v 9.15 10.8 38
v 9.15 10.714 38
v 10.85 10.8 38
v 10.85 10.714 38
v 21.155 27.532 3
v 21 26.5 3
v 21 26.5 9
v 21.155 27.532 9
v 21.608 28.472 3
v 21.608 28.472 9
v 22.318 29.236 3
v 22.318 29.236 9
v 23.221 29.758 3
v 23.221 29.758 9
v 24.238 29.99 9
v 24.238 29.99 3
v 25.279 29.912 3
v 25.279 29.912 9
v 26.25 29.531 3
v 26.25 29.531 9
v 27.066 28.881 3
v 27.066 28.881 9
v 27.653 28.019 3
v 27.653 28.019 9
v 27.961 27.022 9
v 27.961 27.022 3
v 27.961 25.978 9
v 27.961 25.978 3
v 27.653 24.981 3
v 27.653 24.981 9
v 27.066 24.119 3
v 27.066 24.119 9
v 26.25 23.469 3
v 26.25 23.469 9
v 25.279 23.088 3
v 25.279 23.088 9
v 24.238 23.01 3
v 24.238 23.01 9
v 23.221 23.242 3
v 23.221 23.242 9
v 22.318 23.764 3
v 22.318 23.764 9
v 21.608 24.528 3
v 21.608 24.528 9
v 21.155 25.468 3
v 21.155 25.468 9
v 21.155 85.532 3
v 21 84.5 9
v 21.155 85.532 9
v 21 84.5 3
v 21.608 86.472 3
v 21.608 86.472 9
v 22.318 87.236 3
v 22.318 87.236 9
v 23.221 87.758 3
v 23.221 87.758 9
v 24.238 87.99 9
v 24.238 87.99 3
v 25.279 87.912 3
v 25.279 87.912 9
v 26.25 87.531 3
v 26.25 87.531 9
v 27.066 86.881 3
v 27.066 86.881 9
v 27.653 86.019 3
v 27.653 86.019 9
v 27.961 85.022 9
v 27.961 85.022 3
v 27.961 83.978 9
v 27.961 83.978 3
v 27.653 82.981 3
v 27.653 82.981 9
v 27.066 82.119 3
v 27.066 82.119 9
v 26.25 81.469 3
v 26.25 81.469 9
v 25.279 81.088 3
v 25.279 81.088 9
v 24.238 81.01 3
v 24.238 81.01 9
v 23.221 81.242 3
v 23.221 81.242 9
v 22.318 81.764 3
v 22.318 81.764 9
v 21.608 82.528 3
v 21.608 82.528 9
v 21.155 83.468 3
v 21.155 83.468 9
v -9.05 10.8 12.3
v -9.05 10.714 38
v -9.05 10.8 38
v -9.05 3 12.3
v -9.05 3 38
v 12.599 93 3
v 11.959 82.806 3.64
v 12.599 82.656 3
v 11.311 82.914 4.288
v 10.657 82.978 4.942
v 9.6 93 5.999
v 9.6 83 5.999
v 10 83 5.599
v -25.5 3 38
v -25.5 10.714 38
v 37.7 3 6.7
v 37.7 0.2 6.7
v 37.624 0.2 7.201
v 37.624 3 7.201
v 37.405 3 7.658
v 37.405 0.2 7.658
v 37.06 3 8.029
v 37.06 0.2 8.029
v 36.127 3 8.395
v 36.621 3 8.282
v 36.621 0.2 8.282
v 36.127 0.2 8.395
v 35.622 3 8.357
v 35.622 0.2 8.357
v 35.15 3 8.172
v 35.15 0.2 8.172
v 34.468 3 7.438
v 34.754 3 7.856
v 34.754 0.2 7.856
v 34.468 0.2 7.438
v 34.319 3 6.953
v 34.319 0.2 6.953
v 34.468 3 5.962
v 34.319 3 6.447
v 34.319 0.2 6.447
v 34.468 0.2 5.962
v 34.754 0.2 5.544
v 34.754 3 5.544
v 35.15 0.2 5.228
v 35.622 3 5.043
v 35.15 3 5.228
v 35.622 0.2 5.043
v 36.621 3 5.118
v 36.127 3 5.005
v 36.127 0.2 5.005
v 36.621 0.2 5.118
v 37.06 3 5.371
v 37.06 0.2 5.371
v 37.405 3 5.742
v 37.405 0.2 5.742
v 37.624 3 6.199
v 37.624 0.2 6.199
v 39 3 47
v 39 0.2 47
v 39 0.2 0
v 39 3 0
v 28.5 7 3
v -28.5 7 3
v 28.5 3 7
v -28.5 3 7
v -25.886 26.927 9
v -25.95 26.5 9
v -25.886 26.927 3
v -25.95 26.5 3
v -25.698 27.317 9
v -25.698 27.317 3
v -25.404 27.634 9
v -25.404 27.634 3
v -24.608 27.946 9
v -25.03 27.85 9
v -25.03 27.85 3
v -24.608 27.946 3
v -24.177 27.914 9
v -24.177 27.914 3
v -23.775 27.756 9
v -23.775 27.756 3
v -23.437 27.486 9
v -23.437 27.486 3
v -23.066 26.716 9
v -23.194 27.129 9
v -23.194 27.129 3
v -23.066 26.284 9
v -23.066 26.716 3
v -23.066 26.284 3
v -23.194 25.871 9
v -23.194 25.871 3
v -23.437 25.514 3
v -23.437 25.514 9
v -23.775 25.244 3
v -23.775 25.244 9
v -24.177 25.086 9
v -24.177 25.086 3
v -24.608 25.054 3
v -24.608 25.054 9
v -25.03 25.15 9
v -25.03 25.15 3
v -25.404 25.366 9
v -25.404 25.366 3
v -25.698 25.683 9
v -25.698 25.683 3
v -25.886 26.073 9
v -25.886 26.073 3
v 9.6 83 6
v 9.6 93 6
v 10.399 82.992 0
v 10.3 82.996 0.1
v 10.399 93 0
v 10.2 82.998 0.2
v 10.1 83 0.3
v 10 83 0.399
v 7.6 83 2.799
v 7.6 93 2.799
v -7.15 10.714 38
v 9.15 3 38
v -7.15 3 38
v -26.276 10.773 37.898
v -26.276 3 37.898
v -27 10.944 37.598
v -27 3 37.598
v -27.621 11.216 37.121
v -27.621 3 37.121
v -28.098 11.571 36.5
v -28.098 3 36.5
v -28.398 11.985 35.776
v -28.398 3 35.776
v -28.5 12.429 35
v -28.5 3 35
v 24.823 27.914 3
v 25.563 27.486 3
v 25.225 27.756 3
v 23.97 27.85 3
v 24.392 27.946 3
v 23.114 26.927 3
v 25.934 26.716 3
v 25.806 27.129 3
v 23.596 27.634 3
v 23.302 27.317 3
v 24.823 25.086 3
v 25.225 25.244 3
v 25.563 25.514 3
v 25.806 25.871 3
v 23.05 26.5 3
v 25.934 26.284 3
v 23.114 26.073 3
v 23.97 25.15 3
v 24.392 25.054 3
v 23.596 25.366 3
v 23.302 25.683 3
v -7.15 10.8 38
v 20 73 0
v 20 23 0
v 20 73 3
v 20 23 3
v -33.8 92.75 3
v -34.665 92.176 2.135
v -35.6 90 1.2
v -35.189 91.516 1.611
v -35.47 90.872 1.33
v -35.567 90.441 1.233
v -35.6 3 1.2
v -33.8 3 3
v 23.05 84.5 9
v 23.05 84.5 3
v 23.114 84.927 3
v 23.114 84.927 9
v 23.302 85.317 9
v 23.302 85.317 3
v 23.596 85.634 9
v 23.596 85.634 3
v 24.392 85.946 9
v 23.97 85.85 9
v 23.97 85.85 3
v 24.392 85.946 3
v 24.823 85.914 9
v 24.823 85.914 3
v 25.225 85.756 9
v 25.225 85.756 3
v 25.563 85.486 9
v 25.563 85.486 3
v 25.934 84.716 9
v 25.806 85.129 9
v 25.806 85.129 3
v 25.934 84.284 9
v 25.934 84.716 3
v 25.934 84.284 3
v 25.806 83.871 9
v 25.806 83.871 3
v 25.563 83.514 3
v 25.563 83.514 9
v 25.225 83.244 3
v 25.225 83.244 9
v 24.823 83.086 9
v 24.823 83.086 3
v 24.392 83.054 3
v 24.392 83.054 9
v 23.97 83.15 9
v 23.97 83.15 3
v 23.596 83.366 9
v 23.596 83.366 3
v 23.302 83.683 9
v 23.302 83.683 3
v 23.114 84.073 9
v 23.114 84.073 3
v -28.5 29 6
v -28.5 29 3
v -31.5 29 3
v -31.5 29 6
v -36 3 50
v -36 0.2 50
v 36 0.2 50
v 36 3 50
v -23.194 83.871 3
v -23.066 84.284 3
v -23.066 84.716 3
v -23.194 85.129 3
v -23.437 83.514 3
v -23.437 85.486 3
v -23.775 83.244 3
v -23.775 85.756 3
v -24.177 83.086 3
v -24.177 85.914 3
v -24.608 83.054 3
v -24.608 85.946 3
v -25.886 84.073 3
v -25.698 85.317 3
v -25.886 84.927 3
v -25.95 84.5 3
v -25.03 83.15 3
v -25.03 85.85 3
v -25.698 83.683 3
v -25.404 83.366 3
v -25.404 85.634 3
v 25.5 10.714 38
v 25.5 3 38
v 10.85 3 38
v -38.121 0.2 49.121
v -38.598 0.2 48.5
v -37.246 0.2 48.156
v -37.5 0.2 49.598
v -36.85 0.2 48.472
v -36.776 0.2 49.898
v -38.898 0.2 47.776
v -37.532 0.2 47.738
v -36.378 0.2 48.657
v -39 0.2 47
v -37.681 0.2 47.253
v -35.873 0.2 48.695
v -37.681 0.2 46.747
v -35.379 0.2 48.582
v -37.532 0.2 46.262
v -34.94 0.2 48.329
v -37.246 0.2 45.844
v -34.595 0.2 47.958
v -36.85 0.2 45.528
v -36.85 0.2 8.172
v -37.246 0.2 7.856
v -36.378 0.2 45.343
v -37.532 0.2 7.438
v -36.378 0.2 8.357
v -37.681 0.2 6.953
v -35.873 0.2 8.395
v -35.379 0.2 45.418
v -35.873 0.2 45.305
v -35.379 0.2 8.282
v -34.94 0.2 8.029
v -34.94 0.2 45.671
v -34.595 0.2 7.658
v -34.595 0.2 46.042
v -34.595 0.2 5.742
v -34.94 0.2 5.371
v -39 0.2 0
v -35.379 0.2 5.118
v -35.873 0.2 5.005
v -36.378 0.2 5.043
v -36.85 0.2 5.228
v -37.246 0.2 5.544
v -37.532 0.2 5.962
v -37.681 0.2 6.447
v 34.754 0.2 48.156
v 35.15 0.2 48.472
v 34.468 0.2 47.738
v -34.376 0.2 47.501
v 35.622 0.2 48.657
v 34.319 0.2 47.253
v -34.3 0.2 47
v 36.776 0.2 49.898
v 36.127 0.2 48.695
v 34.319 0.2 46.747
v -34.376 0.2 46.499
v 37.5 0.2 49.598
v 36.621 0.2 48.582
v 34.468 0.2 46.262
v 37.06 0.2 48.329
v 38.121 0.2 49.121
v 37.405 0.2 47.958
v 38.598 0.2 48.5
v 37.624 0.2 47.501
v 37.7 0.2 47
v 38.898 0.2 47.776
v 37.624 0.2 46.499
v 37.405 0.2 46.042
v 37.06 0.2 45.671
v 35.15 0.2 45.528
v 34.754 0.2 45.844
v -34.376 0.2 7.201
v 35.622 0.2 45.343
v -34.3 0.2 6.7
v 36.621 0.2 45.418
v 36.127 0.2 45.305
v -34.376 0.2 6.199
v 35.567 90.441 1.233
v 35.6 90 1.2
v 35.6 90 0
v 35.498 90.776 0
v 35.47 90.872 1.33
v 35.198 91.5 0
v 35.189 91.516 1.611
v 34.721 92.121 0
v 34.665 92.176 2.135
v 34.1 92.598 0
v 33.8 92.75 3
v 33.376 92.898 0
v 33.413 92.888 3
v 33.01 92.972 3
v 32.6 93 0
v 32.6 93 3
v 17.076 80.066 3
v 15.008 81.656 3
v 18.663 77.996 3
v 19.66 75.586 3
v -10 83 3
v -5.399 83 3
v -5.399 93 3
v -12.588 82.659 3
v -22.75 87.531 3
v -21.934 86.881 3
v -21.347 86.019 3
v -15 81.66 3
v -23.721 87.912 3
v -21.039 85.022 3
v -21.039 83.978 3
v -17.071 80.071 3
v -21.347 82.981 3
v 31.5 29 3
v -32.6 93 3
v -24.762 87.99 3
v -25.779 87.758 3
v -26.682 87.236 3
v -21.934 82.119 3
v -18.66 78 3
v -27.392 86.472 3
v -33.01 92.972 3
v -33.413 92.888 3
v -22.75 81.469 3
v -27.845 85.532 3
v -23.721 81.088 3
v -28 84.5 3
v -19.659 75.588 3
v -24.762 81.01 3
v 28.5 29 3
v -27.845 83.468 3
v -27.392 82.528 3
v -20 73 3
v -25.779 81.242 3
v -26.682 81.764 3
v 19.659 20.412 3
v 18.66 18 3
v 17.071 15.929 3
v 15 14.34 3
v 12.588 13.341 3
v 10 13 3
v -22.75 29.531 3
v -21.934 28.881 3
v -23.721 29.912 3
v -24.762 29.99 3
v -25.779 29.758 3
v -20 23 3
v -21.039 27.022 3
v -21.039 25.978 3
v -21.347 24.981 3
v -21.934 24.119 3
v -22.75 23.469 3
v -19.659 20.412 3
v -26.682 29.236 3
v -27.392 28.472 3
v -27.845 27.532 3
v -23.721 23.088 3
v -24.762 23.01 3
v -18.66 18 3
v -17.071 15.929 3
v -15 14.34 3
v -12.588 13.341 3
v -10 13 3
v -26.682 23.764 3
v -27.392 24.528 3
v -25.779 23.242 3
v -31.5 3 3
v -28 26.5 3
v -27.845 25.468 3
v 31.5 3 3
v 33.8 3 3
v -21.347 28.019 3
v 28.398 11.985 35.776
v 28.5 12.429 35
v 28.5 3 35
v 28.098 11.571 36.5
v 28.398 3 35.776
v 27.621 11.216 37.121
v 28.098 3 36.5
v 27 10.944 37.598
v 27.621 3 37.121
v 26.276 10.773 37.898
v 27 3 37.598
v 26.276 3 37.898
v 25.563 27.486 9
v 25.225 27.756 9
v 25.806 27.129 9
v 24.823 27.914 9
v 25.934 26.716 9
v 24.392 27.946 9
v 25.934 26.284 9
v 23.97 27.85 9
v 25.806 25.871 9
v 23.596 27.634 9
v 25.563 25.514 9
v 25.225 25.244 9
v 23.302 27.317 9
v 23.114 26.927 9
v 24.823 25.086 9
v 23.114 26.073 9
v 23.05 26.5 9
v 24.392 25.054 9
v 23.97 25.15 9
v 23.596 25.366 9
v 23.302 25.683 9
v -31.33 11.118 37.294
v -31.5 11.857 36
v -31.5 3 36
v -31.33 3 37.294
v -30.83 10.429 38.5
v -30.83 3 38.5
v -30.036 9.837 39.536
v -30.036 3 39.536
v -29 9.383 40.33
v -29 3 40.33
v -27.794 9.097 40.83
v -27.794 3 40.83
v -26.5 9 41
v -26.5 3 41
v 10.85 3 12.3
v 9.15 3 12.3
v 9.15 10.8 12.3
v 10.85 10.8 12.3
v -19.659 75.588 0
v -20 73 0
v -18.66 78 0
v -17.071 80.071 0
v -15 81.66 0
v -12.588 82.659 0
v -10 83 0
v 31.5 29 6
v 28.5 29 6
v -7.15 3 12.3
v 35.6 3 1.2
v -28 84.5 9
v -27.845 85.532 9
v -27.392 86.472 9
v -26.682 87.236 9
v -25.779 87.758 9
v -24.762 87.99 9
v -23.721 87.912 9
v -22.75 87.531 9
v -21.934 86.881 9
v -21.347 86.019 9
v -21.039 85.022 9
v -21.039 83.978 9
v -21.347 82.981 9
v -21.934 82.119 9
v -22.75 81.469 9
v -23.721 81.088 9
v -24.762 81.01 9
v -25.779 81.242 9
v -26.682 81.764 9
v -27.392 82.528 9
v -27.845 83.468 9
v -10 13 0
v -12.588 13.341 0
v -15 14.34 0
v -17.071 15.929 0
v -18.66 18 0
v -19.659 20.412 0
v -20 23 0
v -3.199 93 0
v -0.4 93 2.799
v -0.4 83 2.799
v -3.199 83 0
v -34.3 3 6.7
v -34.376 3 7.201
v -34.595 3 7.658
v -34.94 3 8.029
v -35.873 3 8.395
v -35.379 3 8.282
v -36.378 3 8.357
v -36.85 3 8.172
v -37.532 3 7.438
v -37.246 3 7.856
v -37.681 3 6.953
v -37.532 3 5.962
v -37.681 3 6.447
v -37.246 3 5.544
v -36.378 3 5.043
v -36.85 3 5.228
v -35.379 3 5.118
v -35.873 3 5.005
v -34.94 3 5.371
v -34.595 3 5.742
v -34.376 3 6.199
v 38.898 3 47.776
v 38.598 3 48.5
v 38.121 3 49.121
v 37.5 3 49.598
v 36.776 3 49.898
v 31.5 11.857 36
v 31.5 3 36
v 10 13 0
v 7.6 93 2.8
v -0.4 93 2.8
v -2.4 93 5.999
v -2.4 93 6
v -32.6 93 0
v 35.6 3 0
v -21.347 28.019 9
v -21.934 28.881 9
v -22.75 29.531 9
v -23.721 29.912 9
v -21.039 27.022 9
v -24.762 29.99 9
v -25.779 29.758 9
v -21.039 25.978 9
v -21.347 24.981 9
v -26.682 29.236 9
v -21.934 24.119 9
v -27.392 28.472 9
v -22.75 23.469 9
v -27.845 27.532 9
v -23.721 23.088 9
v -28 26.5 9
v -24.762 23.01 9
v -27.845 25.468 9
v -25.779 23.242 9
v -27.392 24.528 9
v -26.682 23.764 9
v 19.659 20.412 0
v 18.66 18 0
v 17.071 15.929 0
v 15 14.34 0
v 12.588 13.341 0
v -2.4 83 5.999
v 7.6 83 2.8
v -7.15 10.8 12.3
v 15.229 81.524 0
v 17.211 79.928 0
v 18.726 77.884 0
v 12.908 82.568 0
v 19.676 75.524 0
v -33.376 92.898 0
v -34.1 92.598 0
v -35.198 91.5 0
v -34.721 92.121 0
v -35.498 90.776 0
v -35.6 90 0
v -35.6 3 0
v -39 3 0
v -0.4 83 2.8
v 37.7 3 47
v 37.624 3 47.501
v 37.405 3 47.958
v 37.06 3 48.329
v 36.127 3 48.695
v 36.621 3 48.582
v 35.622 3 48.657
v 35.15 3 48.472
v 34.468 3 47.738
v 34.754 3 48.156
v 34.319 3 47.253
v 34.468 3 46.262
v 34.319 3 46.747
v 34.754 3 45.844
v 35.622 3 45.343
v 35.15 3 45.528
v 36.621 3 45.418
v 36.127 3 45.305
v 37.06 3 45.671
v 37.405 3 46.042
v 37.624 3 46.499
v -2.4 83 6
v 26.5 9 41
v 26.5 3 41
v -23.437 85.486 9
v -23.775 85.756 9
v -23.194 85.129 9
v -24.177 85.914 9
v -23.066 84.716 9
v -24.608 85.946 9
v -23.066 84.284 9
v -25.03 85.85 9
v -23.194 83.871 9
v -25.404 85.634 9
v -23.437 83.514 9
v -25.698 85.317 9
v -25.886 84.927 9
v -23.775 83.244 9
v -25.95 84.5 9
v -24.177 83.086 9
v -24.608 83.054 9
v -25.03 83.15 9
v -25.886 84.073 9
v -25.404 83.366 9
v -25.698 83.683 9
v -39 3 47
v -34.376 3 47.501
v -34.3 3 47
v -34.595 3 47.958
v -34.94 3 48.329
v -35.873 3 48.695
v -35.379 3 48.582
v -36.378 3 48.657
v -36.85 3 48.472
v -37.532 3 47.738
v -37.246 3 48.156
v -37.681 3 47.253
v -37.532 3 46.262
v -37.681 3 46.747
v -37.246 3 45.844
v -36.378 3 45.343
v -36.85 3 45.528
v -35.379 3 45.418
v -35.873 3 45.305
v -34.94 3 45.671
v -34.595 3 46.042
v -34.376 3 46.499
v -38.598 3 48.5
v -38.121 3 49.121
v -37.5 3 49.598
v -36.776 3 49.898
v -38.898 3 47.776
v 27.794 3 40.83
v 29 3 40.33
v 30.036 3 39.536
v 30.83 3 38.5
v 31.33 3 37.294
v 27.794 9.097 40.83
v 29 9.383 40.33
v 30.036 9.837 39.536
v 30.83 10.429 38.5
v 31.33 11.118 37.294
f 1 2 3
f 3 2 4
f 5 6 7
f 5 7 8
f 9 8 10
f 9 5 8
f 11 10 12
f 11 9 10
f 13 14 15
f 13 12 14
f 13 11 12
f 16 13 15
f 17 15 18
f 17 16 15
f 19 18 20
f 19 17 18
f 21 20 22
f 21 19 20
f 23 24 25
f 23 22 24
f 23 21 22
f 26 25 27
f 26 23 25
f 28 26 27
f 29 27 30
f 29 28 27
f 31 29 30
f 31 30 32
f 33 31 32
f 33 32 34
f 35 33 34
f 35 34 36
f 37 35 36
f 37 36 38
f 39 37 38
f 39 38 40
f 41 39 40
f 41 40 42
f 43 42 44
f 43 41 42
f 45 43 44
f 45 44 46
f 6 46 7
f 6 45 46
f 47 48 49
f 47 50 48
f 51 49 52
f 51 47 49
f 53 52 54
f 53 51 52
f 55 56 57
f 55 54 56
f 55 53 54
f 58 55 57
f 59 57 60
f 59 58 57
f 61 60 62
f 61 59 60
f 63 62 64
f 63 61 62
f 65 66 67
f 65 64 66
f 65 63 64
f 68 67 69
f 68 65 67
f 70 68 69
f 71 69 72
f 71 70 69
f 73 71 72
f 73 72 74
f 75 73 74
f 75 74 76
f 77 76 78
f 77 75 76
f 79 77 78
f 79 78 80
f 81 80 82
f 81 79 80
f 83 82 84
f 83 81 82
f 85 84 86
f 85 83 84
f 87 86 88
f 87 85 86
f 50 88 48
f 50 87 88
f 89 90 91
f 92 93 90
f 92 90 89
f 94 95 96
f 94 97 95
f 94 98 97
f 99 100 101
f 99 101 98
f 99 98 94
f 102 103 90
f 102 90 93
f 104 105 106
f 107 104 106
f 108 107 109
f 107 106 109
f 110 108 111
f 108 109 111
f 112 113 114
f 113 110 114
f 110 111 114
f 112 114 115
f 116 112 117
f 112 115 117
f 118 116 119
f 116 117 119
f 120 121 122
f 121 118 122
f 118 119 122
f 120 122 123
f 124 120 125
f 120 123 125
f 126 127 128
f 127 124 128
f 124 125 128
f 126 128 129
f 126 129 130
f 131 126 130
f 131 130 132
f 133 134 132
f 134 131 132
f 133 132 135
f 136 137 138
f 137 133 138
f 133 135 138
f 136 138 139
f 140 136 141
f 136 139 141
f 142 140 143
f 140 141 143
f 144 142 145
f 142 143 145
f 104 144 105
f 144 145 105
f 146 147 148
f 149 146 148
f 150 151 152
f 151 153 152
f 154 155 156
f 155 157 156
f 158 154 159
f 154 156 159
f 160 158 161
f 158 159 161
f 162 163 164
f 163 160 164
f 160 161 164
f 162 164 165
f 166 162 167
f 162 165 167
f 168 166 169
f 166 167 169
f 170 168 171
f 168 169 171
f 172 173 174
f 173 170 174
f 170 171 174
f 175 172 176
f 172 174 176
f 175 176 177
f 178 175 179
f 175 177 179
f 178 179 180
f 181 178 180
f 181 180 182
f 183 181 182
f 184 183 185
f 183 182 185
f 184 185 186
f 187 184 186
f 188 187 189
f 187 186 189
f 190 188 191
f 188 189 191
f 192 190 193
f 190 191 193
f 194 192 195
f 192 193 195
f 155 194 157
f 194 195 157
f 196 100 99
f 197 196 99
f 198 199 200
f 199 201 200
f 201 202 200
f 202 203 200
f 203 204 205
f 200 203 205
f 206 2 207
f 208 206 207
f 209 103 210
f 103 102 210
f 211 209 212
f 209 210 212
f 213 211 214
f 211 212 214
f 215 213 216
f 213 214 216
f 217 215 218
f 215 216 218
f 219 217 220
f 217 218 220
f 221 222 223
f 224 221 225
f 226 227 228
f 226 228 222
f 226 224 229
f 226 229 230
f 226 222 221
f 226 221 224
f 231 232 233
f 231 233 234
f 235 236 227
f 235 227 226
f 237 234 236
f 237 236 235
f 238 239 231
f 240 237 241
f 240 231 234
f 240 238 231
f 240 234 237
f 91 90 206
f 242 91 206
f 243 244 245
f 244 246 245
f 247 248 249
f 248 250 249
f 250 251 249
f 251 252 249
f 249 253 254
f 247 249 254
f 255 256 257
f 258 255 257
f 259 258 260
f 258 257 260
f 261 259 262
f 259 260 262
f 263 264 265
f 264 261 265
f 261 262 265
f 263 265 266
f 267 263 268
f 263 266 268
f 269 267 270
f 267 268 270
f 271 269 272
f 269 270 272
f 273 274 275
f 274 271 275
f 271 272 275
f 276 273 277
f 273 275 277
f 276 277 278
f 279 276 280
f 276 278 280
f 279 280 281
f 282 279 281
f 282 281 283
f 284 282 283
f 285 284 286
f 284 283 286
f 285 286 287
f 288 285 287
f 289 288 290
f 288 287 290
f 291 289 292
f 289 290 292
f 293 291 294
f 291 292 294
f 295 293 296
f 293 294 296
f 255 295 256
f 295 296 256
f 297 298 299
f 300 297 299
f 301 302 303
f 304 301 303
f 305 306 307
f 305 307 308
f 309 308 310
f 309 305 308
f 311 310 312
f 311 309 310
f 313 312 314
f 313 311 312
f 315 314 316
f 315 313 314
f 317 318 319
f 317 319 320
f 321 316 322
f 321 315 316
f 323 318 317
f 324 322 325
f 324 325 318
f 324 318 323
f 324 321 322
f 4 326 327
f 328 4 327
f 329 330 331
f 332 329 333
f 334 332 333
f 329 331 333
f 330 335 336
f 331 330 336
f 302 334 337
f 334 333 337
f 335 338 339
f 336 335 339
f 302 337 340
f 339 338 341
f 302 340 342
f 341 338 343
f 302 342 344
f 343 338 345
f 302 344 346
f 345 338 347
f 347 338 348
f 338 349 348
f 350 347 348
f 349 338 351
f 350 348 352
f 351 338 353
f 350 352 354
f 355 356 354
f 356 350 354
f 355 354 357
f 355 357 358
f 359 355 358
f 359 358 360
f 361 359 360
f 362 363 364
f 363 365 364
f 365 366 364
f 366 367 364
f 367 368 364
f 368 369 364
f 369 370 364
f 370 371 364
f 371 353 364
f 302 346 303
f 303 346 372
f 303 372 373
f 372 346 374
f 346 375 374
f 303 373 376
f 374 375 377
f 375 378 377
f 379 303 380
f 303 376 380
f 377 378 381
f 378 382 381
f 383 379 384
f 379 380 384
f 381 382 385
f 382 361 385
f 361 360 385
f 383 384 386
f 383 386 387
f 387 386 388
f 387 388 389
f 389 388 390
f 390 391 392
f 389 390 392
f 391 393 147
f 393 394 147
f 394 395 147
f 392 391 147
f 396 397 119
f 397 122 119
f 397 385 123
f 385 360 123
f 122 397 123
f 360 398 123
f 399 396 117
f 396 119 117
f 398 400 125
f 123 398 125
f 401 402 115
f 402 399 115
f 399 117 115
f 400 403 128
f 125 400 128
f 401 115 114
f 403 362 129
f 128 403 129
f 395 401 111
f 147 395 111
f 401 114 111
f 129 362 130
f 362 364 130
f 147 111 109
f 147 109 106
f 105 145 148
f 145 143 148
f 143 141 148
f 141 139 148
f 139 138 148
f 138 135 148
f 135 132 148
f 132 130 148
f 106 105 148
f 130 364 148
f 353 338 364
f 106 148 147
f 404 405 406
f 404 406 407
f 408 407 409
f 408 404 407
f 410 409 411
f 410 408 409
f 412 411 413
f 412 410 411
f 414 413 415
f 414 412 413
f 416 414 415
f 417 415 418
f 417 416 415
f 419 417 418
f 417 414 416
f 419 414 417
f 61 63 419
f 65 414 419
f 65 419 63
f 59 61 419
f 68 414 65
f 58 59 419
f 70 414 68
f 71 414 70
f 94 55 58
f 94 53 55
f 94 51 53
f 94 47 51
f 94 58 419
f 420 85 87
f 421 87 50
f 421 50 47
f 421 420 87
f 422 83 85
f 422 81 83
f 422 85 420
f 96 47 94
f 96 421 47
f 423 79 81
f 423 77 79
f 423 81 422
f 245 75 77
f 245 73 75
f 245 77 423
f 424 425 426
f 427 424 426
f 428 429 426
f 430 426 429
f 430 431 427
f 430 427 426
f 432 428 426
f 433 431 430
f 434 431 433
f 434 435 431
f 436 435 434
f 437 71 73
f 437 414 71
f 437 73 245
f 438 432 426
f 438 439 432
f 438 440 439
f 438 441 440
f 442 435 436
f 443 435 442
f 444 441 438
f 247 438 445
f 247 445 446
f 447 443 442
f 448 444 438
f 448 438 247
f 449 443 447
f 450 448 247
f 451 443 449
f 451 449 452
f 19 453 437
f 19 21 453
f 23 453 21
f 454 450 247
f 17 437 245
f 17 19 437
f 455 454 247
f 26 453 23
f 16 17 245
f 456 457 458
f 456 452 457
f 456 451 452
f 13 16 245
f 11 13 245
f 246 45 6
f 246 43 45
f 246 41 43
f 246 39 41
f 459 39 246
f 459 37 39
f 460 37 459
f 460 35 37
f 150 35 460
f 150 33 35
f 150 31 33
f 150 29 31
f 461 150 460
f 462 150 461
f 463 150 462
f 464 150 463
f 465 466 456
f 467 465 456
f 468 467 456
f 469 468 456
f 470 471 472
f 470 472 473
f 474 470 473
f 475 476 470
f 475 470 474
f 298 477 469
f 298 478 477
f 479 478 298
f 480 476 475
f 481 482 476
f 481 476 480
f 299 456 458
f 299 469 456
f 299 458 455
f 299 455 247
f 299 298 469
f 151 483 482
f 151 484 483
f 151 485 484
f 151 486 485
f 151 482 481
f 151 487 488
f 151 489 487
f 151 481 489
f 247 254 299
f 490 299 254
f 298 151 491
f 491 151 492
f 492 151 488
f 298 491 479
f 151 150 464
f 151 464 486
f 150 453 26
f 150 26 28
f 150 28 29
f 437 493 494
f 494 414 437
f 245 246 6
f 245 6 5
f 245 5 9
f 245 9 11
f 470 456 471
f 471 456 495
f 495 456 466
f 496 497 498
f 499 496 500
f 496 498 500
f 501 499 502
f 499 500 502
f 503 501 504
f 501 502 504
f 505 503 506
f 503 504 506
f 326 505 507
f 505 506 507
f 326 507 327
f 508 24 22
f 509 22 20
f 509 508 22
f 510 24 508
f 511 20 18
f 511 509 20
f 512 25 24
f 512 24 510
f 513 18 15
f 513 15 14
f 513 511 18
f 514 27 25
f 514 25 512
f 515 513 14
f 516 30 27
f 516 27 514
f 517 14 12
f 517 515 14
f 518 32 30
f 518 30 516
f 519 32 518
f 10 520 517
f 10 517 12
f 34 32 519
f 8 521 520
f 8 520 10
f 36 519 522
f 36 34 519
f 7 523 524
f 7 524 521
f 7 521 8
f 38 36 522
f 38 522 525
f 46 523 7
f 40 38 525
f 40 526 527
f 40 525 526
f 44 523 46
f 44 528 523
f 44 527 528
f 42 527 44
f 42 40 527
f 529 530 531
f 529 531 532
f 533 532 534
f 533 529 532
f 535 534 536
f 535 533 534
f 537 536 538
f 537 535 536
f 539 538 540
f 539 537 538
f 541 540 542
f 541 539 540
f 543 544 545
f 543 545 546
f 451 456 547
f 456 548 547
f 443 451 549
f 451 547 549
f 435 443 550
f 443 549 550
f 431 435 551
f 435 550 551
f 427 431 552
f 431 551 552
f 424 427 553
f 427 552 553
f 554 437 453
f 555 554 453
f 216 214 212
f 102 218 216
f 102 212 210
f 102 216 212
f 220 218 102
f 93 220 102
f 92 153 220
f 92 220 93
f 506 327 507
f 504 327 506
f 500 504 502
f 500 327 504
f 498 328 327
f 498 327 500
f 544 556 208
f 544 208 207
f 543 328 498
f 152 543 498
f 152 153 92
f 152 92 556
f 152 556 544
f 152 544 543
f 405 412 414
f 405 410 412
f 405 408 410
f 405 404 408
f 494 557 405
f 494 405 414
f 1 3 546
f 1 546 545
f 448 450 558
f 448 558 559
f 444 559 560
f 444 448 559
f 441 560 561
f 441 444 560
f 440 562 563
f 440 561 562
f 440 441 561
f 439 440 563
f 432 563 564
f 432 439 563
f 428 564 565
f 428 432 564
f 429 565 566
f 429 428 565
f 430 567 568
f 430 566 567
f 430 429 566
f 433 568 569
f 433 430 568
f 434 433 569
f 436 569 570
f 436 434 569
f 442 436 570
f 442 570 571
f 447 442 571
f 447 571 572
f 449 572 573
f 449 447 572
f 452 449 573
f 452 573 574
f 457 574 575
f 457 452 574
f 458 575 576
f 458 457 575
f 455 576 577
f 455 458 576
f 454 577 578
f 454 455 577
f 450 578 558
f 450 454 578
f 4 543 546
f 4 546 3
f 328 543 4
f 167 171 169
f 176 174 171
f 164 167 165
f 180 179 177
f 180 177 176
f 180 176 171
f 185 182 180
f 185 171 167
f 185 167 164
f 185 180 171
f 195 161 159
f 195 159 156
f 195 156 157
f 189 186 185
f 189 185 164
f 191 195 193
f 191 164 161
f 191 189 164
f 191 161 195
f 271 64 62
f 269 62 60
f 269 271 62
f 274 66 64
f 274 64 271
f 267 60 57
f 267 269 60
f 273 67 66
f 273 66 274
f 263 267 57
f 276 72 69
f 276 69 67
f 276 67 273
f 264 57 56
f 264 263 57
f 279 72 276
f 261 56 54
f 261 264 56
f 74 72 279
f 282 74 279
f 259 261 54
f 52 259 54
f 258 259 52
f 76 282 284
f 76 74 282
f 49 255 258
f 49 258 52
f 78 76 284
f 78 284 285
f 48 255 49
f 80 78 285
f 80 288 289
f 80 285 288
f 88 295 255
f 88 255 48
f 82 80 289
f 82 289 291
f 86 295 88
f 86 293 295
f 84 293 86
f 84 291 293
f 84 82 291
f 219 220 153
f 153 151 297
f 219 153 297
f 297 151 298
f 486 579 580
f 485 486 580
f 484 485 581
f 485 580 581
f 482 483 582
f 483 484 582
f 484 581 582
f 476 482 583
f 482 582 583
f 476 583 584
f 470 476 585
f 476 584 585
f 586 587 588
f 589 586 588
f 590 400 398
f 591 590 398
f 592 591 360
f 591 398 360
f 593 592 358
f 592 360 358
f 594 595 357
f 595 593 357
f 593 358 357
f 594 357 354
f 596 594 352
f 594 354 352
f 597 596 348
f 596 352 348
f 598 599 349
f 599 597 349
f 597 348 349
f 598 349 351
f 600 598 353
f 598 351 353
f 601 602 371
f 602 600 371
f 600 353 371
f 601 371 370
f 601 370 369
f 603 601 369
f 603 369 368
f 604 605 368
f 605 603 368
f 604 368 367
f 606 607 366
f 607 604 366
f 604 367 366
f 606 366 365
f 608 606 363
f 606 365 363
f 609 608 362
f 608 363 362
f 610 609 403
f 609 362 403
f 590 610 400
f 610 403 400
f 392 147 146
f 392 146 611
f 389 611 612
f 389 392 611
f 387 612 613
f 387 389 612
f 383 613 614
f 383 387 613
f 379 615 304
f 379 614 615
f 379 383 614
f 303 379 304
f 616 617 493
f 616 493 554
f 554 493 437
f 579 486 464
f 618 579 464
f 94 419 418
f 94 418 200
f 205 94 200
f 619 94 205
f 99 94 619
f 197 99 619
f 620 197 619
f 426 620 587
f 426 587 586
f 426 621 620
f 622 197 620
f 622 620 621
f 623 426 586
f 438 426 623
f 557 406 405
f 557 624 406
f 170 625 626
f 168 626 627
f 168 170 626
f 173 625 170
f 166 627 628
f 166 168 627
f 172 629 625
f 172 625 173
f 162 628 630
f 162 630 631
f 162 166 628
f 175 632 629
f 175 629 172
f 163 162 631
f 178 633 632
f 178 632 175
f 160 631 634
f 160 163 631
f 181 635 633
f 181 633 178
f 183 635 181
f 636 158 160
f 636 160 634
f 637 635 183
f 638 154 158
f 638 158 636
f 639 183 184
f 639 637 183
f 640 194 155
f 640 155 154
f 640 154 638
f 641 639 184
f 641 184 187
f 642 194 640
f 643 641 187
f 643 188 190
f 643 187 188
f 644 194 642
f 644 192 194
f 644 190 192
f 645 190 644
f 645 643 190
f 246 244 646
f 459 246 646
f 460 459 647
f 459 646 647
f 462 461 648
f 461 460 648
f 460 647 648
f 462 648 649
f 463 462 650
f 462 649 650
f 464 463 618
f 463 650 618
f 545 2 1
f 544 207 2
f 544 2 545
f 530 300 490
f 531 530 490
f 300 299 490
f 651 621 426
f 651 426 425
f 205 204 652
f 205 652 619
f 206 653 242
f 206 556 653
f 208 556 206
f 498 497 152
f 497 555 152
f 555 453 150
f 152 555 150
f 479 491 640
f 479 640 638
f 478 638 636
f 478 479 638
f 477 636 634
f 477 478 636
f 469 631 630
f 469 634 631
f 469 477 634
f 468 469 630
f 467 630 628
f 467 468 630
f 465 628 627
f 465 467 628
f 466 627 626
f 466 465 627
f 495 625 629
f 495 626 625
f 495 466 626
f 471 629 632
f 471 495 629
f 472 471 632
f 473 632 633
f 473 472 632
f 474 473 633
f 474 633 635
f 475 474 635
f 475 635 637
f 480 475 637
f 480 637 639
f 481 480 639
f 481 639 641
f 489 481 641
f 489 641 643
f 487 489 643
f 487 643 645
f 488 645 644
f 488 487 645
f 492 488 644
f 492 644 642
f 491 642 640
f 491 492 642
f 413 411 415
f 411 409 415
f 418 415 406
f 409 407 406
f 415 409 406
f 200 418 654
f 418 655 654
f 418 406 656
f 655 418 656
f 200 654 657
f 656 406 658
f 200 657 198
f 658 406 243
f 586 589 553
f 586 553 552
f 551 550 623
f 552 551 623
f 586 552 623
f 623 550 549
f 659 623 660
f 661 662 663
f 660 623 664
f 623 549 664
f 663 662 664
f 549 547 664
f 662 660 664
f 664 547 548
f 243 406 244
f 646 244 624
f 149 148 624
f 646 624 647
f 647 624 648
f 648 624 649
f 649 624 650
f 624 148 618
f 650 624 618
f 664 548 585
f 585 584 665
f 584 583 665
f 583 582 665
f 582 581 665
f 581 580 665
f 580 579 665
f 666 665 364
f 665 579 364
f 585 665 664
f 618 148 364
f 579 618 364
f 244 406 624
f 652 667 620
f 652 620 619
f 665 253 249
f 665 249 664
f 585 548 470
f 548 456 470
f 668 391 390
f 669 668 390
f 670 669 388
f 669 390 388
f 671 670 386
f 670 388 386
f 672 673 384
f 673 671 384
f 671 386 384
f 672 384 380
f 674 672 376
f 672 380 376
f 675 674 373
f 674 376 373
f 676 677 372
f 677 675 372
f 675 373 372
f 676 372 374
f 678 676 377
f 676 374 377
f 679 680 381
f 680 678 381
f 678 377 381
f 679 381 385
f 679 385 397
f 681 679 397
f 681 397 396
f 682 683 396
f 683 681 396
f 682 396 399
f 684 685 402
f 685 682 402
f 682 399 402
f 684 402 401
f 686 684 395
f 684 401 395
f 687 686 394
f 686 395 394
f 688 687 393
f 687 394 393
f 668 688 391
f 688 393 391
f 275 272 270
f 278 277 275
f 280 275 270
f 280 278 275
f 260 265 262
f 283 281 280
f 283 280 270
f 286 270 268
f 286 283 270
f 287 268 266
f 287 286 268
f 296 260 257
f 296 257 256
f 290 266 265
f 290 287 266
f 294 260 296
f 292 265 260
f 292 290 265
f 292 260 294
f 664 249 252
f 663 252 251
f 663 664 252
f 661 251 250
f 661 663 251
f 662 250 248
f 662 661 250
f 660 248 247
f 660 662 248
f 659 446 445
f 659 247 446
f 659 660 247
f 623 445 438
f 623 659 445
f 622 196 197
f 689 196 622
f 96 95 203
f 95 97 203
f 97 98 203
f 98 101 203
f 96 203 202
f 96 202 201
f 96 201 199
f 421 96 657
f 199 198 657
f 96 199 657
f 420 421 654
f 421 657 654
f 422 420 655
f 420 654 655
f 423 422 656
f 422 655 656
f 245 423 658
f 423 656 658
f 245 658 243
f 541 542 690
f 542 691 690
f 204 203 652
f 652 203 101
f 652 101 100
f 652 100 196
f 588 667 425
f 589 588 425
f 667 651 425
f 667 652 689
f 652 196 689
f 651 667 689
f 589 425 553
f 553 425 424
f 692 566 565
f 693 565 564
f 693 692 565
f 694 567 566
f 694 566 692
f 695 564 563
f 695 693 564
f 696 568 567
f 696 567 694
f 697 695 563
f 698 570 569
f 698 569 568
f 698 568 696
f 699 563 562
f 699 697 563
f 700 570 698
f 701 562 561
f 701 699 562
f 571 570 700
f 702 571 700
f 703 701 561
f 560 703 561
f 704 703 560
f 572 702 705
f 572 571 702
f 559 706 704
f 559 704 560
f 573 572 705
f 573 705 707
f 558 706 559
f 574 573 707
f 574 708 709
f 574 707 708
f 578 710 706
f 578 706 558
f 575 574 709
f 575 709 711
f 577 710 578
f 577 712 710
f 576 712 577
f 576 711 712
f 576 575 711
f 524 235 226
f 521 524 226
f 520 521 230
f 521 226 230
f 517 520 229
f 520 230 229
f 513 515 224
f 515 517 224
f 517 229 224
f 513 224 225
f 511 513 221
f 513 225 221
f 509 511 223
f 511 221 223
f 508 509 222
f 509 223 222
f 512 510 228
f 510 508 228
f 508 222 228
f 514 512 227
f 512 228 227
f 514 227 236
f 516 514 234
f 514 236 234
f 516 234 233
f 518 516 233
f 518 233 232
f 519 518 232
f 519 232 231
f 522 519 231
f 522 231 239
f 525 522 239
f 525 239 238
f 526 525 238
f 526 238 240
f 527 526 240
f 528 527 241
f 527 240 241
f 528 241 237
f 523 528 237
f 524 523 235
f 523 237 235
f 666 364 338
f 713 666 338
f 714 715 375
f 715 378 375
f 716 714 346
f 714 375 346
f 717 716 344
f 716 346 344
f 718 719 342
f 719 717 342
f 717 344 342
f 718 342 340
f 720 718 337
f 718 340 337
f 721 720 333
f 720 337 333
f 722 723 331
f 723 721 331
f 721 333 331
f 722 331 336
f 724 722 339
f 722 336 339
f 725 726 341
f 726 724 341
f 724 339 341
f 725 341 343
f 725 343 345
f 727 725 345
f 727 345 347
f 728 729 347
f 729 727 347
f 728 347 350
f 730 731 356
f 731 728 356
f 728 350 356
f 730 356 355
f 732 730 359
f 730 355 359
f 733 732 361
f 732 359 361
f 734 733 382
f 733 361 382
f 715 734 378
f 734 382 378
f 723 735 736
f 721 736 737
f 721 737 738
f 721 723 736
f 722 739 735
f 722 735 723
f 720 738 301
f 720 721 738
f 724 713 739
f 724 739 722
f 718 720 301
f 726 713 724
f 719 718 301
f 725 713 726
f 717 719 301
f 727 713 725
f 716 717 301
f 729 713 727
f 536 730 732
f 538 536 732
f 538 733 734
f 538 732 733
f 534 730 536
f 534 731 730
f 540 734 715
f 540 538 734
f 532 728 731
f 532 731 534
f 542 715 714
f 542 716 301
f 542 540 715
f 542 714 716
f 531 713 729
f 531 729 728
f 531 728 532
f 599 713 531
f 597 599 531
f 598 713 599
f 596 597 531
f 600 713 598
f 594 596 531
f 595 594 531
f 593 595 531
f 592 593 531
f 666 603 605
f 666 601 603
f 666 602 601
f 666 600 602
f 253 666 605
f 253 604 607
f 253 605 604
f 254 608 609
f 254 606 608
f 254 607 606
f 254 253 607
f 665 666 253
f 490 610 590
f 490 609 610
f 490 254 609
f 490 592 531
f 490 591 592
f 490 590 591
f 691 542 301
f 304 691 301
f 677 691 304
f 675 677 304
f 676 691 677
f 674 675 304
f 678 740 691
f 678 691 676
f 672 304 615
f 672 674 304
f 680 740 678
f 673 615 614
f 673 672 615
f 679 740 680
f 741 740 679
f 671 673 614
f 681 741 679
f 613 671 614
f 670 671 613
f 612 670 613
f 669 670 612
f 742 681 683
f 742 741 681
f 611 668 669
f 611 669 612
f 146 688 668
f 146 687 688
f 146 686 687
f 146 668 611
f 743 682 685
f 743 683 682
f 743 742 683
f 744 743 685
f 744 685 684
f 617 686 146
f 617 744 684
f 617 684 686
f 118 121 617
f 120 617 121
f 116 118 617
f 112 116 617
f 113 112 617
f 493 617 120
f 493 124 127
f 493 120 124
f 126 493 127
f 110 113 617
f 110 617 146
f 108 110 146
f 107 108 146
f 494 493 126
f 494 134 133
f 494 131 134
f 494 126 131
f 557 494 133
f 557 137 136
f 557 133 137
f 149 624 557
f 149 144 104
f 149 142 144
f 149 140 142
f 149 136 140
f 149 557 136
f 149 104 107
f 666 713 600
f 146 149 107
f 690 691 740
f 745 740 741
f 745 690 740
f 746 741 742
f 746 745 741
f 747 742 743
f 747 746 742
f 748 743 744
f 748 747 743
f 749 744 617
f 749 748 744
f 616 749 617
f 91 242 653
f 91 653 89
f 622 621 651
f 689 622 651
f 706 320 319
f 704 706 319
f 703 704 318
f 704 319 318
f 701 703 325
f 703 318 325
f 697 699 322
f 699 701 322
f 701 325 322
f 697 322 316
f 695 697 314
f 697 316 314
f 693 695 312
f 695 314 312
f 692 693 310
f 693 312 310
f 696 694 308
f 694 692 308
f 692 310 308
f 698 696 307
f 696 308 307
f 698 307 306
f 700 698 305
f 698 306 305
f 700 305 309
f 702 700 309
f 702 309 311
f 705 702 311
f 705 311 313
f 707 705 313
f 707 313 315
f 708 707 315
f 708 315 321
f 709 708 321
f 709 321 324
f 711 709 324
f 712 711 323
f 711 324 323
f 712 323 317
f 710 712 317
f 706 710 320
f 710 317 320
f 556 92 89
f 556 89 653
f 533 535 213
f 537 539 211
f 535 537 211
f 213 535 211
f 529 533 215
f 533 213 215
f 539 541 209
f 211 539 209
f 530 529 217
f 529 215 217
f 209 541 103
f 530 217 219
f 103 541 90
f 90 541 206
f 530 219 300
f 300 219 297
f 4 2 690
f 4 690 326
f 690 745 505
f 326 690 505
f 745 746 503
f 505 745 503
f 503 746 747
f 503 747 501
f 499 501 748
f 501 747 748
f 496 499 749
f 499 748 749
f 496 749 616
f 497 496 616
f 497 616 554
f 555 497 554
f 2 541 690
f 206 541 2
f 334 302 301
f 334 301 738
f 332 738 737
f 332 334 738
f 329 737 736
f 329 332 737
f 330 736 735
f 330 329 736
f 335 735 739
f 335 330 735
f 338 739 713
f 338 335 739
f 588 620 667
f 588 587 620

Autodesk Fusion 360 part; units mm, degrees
sketch "Sketch3" plane through (0, 0, 0) normal (0, 1, 0) x (1, 0, 0)
  line L0 (-39, -50) -> (39, -50)
  line L1 (39, -50) -> (39, 0)
  line L2 (39, 0) -> (-39, 0)
  line L3 (-39, 0) -> (-39, -50)
  line L4 (-56.129, 0) -> (56.129, 0) construction
  circle A0 centre (-36, -47) radius 1.7
  circle A1 centre (-36, -47) radius 3
  circle A2 centre (36, -47) radius 1.7
  circle A3 centre (36, -47) radius 3
  circle A4 centre (-36, -6.7) radius 1.7
  circle A5 centre (-36, -6.7) radius 3
  circle A6 centre (36, -6.7) radius 1.7
  circle A7 centre (36, -6.7) radius 3
  line L5 (-39, -5) -> (39, -5) construction
  dimension "d32" = 50
  dimension "d33" = 78
  dimension "d34" = 39
  dimension "d35" = 3.4
  dimension "d36" = 6
  dimension "d37" = 3.4
  dimension "d38" = 6
  dimension "d39" = 3.4
  dimension "d40" = 6
  dimension "d41" = 3.4
  dimension "d42" = 6
  dimension "d43" = 5
extrude "Extrude3" add sketch "Sketch3" along normal blind 3 contours A7 | A5 | L0 L1 L2 L3 A1 A3 | A1 | A3
sketch "Sketch4" plane through (0, 3, 0) normal (0, 1, 0) x (-1, 0, 0)
  circle A0 centre (36, 47) radius 1.7
  circle A1 centre (36, 6.7) radius 1.7
  circle A2 centre (-36, 47) radius 1.7
  circle A3 centre (-36, 6.7) radius 1.7
  line L0 (36, 50) -> (-36, 50)
  arc A4 (-36, 50) -> (-39, 47) centre (-36, 47) ccw
  line L1 (-39, 47) -> (-39, 0)
  line L2 (-39, 0) -> (39, 0)
  line L3 (39, 0) -> (39, 47)
  arc A5 (39, 47) -> (36, 50) centre (36, 47) ccw
  line L4 (-39, 3) -> (39, 3) construction
  line L5 (-35.6, 3) -> (35.6, 3)
  line L6 (35.6, 3) -> (35.6, 0)
  line L7 (35.6, 0) -> (-35.6, 0)
  line L8 (-35.6, 0) -> (-35.6, 3)
  line L9 (0, 50) -> (0, 0) construction
  line L10 (35.6, 1.2) -> (33.8, 3)
  line L11 (35.6, 1.2) -> (38.7868, 1.2) construction
  line L12 (-35.6, 1.2) -> (-33.8, 3)
  line L13 (-35.6, 1.2) -> (-32.9375, 1.2) construction
  point P0 (0, 3)
  dimension "d46" = 3
  dimension "d47" = 71.2
  dimension "d48" = 135
  dimension "d49" = 1.2
  dimension "d50" = 45
  dimension "d51" = 1.2
extrude "Extrude4" add sketch "Sketch4" along normal blind 90 contours L2 L5 L6 L7 L8 L10 L12
sketch "Sketch5" plane through (0, 0, 3) normal (0, 0, 1) x (-1, 0, 0)
  line L0 (33.8, -3) -> (-33.8, -3)
  line L1 (-33.8, -3) -> (-33.8, -93)
  line L2 (-33.8, -93) -> (33.8, -93)
  line L3 (33.8, -93) -> (33.8, -3)
  line L4 (0, -3) -> (0, -93) construction
  circle A0 centre (24.5, -26.5) radius 1.45
  circle A1 centre (24.5, -26.5) radius 3.5
  circle A2 centre (24.5, -84.5) radius 1.45
  circle A3 centre (24.5, -84.5) radius 3.5
  circle A4 centre (-24.5, -26.5) radius 1.45
  circle A5 centre (-24.5, -26.5) radius 3.5
  circle A6 centre (-24.5, -84.5) radius 1.45
  circle A7 centre (-24.5, -84.5) radius 3.5
  line L5 (28, -3) -> (-28, -3)
  line L6 (-28, -3) -> (-28, -88) construction
  line L7 (-28, -88) -> (28, -88) construction
  line L8 (28, -88) -> (28, -3) construction
  line L9 (20, -13) -> (-20, -13)
  line L10 (-20, -13) -> (-20, -83)
  line L11 (-20, -83) -> (20, -83)
  line L12 (20, -83) -> (20, -13)
  line L13 (33.8, -48) -> (-33.8, -48) construction
  line L14 (-28.5, -3) -> (-31.5, -3)
  line L15 (-31.5, -3) -> (-31.5, -29)
  line L16 (-31.5, -29) -> (-28.5, -29)
  line L17 (-28.5, -29) -> (-28.5, -3)
  point P0 (0, -88)
  point P1 (-28, -3)
  point P2 (0, -13)
  point P3 (20, -48)
  point P4 (-33.8, -48)
  point P5 (33.8, -48)
  dimension "d54" = 2.9
  dimension "d55" = 7
  dimension "d56" = 2.9
  dimension "d57" = 7
  dimension "d58" = 2.9
  dimension "d59" = 7
  dimension "d60" = 2.9
  dimension "d61" = 7
  dimension "d62" = 58
  dimension "d63" = 49
  dimension "d64" = 23.5
  dimension "d70" = 56
  dimension "d71" = 85
  dimension "d86" = 70
  dimension "d87" = 70
  dimension "d88" = 40
  dimension "d159" = 3
  dimension "d160" = 26
  dimension "d161" = 7
extrude "Extrude8" add sketch "Sketch5" along normal blind 38 contours L0 L14 L15 L16 L17
chamfer "Chamfer4" distance 20 distance2 35 1 edges at (30, 29, 41) measured on face at (30.5, 11.6667, 41)
mirror "Mirror1" about plane through (0, 0, 0) normal (1, 0, 0) of "Extrude8"
extrude "Extrude7" cut sketch "Sketch5" against normal blind 3 contours L9 L10 L11 L12
extrude "Extrude5" add sketch "Sketch5" along normal blind 6 contours A1 | A3 | A5 | A7
fillet "Fillet1" radius 3 2 edges at (35.6, 93, 0.6) (-35.6, 93, 0.6)
sketch "Sketch7" plane through (0, 0, 0) normal (0, -1, 0) x (1, 0, 0)
  circle A0 centre (-36, 47) radius 1.7
  circle A1 centre (-36, 6.7) radius 1.7
  circle A2 centre (36, 47) radius 1.7
  circle A3 centre (36, 6.7) radius 1.7
  line L0 (36, 50) -> (-36, 50)
  arc A4 (-36, 50) -> (-39, 47) centre (-36, 47) ccw
  line L1 (-39, 47) -> (-39, 0)
  line L2 (-39, 0) -> (39, 0)
  line L3 (39, 0) -> (39, 47)
  arc A5 (39, 47) -> (36, 50) centre (36, 47) ccw
  line L4 (-28, 50) -> (-28, 0) construction
  line L5 (28, 50) -> (28, 0) construction
  line L6 (19, 50) -> (19, 48.3878)
  line L7 (-39, 3) -> (39, 3) construction
  line L8 (-21, 9) -> (-28, 9)
  line L9 (28, 9) -> (21, 9)
  point P0 (-24.5, 9)
  point P1 (24.5, 9)
  dimension "d72" = 11
  dimension "d73" = 11
  dimension "d74" = 3
fillet "Fillet2" radius 10 4 edges at (-20, 13, 1.5) (20, 13, 1.5) (-20, 83, 1.5) (20, 83, 1.5)
sketch "Sketch8" plane through (0, 0, 0) normal (0, 0, -1) x (1, 0, 0)
  line L0 (-10, -13) -> (10, -13)
  arc A0 (20, -23) -> (10, -13) centre (10, -23) ccw
  line L1 (20, -23) -> (20, -73)
  arc A1 (10, -83) -> (20, -73) centre (10, -73) ccw
  line L2 (10, -83) -> (-10, -83)
  arc A2 (-20, -73) -> (-10, -83) centre (-10, -73) ccw
  line L3 (-20, -73) -> (-20, -23)
  arc A3 (-10, -13) -> (-20, -23) centre (-10, -23) ccw
  arc A4 (-35.6, -90) -> (-32.6, -93) centre (-32.6, -90) ccw
  line L4 (-32.6, -93) -> (32.6, -93)
  arc A5 (32.6, -93) -> (35.6, -90) centre (32.6, -90) ccw
  line L5 (35.6, -90) -> (35.6, -3)
  line L6 (35.6, -3) -> (39, -3)
  line L7 (39, -3) -> (39, 0)
  line L8 (39, 0) -> (-39, 0)
  line L9 (-39, 0) -> (-39, -3)
  line L10 (-39, -3) -> (-35.6, -3)
  line L11 (-35.6, -3) -> (-35.6, -90)
  line L12 (3.6, -93) -> (3.6, -80.0711) construction
  line L13 (7.6, -93) -> (-0.4, -93)
  line L14 (-0.4, -93) -> (-0.4, -73.9514)
  line L15 (-0.4, -73.9514) -> (7.6, -73.9514)
  line L16 (7.6, -73.9514) -> (7.6, -93)
  dimension "d166" = 8
  dimension "d167" = 32
extrude "Extrude9" cut sketch "Sketch8" against normal blind 2.8 contours L2 L4 L13 L14 L16
sketch "Sketch11" plane through (0, 0, 3) normal (0, 0, 1) x (-1, 0, 0)
  line L0 (28.5, -29) -> (28.5, -3)
  line L1 (28.5, -3) -> (-28.5, -3)
  line L2 (-28.5, -3) -> (-28.5, -29)
  line L3 (-28.5, -29) -> (-31.5, -29)
  line L4 (-31.5, -29) -> (-31.5, -3)
  line L5 (-31.5, -3) -> (-33.8, -3)
  line L6 (-33.8, -3) -> (-33.8, -92.7495)
  arc A0 (-33.8, -92.7495) -> (-32.6, -93) centre (-32.6, -90) ccw
  line L7 (-32.6, -93) -> (32.6, -93)
  arc A1 (32.6, -93) -> (33.8, -92.7495) centre (32.6, -90) ccw
  line L8 (33.8, -92.7495) -> (33.8, -3)
  line L9 (33.8, -3) -> (31.5, -3)
  line L10 (31.5, -3) -> (31.5, -29)
  line L11 (31.5, -29) -> (28.5, -29)
  circle A2 centre (-24.5, -26.5) radius 3.5
  circle A3 centre (24.5, -26.5) radius 3.5
  line L12 (-10, -13) -> (10, -13)
  arc A4 (20, -23) -> (10, -13) centre (10, -23) ccw
  line L13 (20, -23) -> (20, -73)
  arc A5 (10, -83) -> (20, -73) centre (10, -73) ccw
  line L14 (10, -83) -> (-10, -83)
  arc A6 (-20, -73) -> (-10, -83) centre (-10, -73) ccw
  line L15 (-20, -73) -> (-20, -23)
  arc A7 (-10, -13) -> (-20, -23) centre (-10, -23) ccw
  circle A8 centre (24.5, -84.5) radius 3.5
  circle A9 centre (-24.5, -84.5) radius 3.5
  line L16 (-7.6, -83) -> (-7.6, -93)
  line L17 (0.4, -93) -> (0.4, -83)
  line L18 (-9.6, -83) -> (-9.6, -93)
  line L19 (2.4, -93) -> (2.4, -83)
  dimension "d170" = 2
  dimension "d171" = 2
extrude "Extrude10" add sketch "Sketch11" along normal blind 3 contours L7 L14 L17 L19 | L7 L14 L16 L17 | L7 L14 L16 L18
chamfer "Chamfer5" distance 3 angle 45 2 edges at (-2.4, 88, 3) (9.6, 88, 3)
chamfer "Chamfer6" distance 4 angle 45 1 edges at (0, 3, 3)
chamfer "Chamfer7" distance 2.8 angle 45 2 edges at (7.6, 88, 0) (-0.4, 88, 0)
chamfer "Chamfer8" distance 35 distance2 20 1 edges at (-30, 29, 41) measured on face at (-30.5, 29, 15.6667)
sketch "Sketch13" plane through (28.5, 0, 0) normal (-1, 0, 0) x (0, -1, 0)
  line L0 (-7, 3) -> (-3, 7)
  line L1 (-3, 7) -> (-3, 41)
  line L2 (-3, 41) -> (-9, 41)
  line L3 (-9, 41) -> (-29, 6)
  line L4 (-29, 6) -> (-29, 3)
  line L5 (-29, 3) -> (-7, 3)
  line L6 (-3, 41) -> (-10.7143, 41)
  line L7 (-10.7143, 41) -> (-10.7143, 38)
  line L8 (-10.7143, 38) -> (-3, 38)
  line L9 (-3, 38) -> (-3, 41)
  dimension "d311" = 3
extrude "Extrude12" add sketch "Sketch13" along normal up to surface (57 mm away) contours L1 L2 L3 L6 L8 L9
sketch "Sketch14" plane through (0, 3, 0) normal (0, 1, 0) x (-1, 0, 0)
  line L0 (28.5, 38) -> (-28.5, 38)
  line L1 (-28.5, 38) -> (-28.5, 7)
  line L2 (-28.5, 7) -> (28.5, 7)
  line L3 (28.5, 7) -> (28.5, 38)
  line L4 (-10.85, 38) -> (-9.15, 38)
  line L5 (-9.15, 38) -> (-9.15, 12.3)
  line L6 (-9.15, 12.3) -> (-10.85, 12.3)
  line L7 (-10.85, 12.3) -> (-10.85, 38)
  line L8 (7.15, 38) -> (9.05, 38)
  line L9 (9.05, 38) -> (9.05, 12.3)
  line L10 (9.05, 12.3) -> (7.15, 12.3)
  line L11 (7.15, 12.3) -> (7.15, 38)
extrude "Extrude13" add sketch "Sketch14" along normal blind 7.8 contours L0 L8 L9 L10 L11 | L0 L4 L5 L6 L7
fillet "Fillet4" radius 5 2 edges at (-31.5, 6, 41) (31.5, 6, 41)
fillet "Fillet5" radius 3 2 edges at (28.5, 6.8571, 38) (-28.5, 6.8571, 38)
extrude "Extrude14" cut 1 faces at (-11.4895, 0, 33.3208) along direction (0, 1, 0) blind 0.2
equation "d34 = d33 / 2"
equation "d37 = d35"
equation "d38 = d36"
equation "d39 = d35"
equation "d40 = d36"
equation "d41 = d35"
equation "d42 = d36"
equation "d56 = d54"
equation "d57 = d55"
equation "d58 = d54"
equation "d59 = d55"
equation "d60 = d54"
equation "d61 = d55"
